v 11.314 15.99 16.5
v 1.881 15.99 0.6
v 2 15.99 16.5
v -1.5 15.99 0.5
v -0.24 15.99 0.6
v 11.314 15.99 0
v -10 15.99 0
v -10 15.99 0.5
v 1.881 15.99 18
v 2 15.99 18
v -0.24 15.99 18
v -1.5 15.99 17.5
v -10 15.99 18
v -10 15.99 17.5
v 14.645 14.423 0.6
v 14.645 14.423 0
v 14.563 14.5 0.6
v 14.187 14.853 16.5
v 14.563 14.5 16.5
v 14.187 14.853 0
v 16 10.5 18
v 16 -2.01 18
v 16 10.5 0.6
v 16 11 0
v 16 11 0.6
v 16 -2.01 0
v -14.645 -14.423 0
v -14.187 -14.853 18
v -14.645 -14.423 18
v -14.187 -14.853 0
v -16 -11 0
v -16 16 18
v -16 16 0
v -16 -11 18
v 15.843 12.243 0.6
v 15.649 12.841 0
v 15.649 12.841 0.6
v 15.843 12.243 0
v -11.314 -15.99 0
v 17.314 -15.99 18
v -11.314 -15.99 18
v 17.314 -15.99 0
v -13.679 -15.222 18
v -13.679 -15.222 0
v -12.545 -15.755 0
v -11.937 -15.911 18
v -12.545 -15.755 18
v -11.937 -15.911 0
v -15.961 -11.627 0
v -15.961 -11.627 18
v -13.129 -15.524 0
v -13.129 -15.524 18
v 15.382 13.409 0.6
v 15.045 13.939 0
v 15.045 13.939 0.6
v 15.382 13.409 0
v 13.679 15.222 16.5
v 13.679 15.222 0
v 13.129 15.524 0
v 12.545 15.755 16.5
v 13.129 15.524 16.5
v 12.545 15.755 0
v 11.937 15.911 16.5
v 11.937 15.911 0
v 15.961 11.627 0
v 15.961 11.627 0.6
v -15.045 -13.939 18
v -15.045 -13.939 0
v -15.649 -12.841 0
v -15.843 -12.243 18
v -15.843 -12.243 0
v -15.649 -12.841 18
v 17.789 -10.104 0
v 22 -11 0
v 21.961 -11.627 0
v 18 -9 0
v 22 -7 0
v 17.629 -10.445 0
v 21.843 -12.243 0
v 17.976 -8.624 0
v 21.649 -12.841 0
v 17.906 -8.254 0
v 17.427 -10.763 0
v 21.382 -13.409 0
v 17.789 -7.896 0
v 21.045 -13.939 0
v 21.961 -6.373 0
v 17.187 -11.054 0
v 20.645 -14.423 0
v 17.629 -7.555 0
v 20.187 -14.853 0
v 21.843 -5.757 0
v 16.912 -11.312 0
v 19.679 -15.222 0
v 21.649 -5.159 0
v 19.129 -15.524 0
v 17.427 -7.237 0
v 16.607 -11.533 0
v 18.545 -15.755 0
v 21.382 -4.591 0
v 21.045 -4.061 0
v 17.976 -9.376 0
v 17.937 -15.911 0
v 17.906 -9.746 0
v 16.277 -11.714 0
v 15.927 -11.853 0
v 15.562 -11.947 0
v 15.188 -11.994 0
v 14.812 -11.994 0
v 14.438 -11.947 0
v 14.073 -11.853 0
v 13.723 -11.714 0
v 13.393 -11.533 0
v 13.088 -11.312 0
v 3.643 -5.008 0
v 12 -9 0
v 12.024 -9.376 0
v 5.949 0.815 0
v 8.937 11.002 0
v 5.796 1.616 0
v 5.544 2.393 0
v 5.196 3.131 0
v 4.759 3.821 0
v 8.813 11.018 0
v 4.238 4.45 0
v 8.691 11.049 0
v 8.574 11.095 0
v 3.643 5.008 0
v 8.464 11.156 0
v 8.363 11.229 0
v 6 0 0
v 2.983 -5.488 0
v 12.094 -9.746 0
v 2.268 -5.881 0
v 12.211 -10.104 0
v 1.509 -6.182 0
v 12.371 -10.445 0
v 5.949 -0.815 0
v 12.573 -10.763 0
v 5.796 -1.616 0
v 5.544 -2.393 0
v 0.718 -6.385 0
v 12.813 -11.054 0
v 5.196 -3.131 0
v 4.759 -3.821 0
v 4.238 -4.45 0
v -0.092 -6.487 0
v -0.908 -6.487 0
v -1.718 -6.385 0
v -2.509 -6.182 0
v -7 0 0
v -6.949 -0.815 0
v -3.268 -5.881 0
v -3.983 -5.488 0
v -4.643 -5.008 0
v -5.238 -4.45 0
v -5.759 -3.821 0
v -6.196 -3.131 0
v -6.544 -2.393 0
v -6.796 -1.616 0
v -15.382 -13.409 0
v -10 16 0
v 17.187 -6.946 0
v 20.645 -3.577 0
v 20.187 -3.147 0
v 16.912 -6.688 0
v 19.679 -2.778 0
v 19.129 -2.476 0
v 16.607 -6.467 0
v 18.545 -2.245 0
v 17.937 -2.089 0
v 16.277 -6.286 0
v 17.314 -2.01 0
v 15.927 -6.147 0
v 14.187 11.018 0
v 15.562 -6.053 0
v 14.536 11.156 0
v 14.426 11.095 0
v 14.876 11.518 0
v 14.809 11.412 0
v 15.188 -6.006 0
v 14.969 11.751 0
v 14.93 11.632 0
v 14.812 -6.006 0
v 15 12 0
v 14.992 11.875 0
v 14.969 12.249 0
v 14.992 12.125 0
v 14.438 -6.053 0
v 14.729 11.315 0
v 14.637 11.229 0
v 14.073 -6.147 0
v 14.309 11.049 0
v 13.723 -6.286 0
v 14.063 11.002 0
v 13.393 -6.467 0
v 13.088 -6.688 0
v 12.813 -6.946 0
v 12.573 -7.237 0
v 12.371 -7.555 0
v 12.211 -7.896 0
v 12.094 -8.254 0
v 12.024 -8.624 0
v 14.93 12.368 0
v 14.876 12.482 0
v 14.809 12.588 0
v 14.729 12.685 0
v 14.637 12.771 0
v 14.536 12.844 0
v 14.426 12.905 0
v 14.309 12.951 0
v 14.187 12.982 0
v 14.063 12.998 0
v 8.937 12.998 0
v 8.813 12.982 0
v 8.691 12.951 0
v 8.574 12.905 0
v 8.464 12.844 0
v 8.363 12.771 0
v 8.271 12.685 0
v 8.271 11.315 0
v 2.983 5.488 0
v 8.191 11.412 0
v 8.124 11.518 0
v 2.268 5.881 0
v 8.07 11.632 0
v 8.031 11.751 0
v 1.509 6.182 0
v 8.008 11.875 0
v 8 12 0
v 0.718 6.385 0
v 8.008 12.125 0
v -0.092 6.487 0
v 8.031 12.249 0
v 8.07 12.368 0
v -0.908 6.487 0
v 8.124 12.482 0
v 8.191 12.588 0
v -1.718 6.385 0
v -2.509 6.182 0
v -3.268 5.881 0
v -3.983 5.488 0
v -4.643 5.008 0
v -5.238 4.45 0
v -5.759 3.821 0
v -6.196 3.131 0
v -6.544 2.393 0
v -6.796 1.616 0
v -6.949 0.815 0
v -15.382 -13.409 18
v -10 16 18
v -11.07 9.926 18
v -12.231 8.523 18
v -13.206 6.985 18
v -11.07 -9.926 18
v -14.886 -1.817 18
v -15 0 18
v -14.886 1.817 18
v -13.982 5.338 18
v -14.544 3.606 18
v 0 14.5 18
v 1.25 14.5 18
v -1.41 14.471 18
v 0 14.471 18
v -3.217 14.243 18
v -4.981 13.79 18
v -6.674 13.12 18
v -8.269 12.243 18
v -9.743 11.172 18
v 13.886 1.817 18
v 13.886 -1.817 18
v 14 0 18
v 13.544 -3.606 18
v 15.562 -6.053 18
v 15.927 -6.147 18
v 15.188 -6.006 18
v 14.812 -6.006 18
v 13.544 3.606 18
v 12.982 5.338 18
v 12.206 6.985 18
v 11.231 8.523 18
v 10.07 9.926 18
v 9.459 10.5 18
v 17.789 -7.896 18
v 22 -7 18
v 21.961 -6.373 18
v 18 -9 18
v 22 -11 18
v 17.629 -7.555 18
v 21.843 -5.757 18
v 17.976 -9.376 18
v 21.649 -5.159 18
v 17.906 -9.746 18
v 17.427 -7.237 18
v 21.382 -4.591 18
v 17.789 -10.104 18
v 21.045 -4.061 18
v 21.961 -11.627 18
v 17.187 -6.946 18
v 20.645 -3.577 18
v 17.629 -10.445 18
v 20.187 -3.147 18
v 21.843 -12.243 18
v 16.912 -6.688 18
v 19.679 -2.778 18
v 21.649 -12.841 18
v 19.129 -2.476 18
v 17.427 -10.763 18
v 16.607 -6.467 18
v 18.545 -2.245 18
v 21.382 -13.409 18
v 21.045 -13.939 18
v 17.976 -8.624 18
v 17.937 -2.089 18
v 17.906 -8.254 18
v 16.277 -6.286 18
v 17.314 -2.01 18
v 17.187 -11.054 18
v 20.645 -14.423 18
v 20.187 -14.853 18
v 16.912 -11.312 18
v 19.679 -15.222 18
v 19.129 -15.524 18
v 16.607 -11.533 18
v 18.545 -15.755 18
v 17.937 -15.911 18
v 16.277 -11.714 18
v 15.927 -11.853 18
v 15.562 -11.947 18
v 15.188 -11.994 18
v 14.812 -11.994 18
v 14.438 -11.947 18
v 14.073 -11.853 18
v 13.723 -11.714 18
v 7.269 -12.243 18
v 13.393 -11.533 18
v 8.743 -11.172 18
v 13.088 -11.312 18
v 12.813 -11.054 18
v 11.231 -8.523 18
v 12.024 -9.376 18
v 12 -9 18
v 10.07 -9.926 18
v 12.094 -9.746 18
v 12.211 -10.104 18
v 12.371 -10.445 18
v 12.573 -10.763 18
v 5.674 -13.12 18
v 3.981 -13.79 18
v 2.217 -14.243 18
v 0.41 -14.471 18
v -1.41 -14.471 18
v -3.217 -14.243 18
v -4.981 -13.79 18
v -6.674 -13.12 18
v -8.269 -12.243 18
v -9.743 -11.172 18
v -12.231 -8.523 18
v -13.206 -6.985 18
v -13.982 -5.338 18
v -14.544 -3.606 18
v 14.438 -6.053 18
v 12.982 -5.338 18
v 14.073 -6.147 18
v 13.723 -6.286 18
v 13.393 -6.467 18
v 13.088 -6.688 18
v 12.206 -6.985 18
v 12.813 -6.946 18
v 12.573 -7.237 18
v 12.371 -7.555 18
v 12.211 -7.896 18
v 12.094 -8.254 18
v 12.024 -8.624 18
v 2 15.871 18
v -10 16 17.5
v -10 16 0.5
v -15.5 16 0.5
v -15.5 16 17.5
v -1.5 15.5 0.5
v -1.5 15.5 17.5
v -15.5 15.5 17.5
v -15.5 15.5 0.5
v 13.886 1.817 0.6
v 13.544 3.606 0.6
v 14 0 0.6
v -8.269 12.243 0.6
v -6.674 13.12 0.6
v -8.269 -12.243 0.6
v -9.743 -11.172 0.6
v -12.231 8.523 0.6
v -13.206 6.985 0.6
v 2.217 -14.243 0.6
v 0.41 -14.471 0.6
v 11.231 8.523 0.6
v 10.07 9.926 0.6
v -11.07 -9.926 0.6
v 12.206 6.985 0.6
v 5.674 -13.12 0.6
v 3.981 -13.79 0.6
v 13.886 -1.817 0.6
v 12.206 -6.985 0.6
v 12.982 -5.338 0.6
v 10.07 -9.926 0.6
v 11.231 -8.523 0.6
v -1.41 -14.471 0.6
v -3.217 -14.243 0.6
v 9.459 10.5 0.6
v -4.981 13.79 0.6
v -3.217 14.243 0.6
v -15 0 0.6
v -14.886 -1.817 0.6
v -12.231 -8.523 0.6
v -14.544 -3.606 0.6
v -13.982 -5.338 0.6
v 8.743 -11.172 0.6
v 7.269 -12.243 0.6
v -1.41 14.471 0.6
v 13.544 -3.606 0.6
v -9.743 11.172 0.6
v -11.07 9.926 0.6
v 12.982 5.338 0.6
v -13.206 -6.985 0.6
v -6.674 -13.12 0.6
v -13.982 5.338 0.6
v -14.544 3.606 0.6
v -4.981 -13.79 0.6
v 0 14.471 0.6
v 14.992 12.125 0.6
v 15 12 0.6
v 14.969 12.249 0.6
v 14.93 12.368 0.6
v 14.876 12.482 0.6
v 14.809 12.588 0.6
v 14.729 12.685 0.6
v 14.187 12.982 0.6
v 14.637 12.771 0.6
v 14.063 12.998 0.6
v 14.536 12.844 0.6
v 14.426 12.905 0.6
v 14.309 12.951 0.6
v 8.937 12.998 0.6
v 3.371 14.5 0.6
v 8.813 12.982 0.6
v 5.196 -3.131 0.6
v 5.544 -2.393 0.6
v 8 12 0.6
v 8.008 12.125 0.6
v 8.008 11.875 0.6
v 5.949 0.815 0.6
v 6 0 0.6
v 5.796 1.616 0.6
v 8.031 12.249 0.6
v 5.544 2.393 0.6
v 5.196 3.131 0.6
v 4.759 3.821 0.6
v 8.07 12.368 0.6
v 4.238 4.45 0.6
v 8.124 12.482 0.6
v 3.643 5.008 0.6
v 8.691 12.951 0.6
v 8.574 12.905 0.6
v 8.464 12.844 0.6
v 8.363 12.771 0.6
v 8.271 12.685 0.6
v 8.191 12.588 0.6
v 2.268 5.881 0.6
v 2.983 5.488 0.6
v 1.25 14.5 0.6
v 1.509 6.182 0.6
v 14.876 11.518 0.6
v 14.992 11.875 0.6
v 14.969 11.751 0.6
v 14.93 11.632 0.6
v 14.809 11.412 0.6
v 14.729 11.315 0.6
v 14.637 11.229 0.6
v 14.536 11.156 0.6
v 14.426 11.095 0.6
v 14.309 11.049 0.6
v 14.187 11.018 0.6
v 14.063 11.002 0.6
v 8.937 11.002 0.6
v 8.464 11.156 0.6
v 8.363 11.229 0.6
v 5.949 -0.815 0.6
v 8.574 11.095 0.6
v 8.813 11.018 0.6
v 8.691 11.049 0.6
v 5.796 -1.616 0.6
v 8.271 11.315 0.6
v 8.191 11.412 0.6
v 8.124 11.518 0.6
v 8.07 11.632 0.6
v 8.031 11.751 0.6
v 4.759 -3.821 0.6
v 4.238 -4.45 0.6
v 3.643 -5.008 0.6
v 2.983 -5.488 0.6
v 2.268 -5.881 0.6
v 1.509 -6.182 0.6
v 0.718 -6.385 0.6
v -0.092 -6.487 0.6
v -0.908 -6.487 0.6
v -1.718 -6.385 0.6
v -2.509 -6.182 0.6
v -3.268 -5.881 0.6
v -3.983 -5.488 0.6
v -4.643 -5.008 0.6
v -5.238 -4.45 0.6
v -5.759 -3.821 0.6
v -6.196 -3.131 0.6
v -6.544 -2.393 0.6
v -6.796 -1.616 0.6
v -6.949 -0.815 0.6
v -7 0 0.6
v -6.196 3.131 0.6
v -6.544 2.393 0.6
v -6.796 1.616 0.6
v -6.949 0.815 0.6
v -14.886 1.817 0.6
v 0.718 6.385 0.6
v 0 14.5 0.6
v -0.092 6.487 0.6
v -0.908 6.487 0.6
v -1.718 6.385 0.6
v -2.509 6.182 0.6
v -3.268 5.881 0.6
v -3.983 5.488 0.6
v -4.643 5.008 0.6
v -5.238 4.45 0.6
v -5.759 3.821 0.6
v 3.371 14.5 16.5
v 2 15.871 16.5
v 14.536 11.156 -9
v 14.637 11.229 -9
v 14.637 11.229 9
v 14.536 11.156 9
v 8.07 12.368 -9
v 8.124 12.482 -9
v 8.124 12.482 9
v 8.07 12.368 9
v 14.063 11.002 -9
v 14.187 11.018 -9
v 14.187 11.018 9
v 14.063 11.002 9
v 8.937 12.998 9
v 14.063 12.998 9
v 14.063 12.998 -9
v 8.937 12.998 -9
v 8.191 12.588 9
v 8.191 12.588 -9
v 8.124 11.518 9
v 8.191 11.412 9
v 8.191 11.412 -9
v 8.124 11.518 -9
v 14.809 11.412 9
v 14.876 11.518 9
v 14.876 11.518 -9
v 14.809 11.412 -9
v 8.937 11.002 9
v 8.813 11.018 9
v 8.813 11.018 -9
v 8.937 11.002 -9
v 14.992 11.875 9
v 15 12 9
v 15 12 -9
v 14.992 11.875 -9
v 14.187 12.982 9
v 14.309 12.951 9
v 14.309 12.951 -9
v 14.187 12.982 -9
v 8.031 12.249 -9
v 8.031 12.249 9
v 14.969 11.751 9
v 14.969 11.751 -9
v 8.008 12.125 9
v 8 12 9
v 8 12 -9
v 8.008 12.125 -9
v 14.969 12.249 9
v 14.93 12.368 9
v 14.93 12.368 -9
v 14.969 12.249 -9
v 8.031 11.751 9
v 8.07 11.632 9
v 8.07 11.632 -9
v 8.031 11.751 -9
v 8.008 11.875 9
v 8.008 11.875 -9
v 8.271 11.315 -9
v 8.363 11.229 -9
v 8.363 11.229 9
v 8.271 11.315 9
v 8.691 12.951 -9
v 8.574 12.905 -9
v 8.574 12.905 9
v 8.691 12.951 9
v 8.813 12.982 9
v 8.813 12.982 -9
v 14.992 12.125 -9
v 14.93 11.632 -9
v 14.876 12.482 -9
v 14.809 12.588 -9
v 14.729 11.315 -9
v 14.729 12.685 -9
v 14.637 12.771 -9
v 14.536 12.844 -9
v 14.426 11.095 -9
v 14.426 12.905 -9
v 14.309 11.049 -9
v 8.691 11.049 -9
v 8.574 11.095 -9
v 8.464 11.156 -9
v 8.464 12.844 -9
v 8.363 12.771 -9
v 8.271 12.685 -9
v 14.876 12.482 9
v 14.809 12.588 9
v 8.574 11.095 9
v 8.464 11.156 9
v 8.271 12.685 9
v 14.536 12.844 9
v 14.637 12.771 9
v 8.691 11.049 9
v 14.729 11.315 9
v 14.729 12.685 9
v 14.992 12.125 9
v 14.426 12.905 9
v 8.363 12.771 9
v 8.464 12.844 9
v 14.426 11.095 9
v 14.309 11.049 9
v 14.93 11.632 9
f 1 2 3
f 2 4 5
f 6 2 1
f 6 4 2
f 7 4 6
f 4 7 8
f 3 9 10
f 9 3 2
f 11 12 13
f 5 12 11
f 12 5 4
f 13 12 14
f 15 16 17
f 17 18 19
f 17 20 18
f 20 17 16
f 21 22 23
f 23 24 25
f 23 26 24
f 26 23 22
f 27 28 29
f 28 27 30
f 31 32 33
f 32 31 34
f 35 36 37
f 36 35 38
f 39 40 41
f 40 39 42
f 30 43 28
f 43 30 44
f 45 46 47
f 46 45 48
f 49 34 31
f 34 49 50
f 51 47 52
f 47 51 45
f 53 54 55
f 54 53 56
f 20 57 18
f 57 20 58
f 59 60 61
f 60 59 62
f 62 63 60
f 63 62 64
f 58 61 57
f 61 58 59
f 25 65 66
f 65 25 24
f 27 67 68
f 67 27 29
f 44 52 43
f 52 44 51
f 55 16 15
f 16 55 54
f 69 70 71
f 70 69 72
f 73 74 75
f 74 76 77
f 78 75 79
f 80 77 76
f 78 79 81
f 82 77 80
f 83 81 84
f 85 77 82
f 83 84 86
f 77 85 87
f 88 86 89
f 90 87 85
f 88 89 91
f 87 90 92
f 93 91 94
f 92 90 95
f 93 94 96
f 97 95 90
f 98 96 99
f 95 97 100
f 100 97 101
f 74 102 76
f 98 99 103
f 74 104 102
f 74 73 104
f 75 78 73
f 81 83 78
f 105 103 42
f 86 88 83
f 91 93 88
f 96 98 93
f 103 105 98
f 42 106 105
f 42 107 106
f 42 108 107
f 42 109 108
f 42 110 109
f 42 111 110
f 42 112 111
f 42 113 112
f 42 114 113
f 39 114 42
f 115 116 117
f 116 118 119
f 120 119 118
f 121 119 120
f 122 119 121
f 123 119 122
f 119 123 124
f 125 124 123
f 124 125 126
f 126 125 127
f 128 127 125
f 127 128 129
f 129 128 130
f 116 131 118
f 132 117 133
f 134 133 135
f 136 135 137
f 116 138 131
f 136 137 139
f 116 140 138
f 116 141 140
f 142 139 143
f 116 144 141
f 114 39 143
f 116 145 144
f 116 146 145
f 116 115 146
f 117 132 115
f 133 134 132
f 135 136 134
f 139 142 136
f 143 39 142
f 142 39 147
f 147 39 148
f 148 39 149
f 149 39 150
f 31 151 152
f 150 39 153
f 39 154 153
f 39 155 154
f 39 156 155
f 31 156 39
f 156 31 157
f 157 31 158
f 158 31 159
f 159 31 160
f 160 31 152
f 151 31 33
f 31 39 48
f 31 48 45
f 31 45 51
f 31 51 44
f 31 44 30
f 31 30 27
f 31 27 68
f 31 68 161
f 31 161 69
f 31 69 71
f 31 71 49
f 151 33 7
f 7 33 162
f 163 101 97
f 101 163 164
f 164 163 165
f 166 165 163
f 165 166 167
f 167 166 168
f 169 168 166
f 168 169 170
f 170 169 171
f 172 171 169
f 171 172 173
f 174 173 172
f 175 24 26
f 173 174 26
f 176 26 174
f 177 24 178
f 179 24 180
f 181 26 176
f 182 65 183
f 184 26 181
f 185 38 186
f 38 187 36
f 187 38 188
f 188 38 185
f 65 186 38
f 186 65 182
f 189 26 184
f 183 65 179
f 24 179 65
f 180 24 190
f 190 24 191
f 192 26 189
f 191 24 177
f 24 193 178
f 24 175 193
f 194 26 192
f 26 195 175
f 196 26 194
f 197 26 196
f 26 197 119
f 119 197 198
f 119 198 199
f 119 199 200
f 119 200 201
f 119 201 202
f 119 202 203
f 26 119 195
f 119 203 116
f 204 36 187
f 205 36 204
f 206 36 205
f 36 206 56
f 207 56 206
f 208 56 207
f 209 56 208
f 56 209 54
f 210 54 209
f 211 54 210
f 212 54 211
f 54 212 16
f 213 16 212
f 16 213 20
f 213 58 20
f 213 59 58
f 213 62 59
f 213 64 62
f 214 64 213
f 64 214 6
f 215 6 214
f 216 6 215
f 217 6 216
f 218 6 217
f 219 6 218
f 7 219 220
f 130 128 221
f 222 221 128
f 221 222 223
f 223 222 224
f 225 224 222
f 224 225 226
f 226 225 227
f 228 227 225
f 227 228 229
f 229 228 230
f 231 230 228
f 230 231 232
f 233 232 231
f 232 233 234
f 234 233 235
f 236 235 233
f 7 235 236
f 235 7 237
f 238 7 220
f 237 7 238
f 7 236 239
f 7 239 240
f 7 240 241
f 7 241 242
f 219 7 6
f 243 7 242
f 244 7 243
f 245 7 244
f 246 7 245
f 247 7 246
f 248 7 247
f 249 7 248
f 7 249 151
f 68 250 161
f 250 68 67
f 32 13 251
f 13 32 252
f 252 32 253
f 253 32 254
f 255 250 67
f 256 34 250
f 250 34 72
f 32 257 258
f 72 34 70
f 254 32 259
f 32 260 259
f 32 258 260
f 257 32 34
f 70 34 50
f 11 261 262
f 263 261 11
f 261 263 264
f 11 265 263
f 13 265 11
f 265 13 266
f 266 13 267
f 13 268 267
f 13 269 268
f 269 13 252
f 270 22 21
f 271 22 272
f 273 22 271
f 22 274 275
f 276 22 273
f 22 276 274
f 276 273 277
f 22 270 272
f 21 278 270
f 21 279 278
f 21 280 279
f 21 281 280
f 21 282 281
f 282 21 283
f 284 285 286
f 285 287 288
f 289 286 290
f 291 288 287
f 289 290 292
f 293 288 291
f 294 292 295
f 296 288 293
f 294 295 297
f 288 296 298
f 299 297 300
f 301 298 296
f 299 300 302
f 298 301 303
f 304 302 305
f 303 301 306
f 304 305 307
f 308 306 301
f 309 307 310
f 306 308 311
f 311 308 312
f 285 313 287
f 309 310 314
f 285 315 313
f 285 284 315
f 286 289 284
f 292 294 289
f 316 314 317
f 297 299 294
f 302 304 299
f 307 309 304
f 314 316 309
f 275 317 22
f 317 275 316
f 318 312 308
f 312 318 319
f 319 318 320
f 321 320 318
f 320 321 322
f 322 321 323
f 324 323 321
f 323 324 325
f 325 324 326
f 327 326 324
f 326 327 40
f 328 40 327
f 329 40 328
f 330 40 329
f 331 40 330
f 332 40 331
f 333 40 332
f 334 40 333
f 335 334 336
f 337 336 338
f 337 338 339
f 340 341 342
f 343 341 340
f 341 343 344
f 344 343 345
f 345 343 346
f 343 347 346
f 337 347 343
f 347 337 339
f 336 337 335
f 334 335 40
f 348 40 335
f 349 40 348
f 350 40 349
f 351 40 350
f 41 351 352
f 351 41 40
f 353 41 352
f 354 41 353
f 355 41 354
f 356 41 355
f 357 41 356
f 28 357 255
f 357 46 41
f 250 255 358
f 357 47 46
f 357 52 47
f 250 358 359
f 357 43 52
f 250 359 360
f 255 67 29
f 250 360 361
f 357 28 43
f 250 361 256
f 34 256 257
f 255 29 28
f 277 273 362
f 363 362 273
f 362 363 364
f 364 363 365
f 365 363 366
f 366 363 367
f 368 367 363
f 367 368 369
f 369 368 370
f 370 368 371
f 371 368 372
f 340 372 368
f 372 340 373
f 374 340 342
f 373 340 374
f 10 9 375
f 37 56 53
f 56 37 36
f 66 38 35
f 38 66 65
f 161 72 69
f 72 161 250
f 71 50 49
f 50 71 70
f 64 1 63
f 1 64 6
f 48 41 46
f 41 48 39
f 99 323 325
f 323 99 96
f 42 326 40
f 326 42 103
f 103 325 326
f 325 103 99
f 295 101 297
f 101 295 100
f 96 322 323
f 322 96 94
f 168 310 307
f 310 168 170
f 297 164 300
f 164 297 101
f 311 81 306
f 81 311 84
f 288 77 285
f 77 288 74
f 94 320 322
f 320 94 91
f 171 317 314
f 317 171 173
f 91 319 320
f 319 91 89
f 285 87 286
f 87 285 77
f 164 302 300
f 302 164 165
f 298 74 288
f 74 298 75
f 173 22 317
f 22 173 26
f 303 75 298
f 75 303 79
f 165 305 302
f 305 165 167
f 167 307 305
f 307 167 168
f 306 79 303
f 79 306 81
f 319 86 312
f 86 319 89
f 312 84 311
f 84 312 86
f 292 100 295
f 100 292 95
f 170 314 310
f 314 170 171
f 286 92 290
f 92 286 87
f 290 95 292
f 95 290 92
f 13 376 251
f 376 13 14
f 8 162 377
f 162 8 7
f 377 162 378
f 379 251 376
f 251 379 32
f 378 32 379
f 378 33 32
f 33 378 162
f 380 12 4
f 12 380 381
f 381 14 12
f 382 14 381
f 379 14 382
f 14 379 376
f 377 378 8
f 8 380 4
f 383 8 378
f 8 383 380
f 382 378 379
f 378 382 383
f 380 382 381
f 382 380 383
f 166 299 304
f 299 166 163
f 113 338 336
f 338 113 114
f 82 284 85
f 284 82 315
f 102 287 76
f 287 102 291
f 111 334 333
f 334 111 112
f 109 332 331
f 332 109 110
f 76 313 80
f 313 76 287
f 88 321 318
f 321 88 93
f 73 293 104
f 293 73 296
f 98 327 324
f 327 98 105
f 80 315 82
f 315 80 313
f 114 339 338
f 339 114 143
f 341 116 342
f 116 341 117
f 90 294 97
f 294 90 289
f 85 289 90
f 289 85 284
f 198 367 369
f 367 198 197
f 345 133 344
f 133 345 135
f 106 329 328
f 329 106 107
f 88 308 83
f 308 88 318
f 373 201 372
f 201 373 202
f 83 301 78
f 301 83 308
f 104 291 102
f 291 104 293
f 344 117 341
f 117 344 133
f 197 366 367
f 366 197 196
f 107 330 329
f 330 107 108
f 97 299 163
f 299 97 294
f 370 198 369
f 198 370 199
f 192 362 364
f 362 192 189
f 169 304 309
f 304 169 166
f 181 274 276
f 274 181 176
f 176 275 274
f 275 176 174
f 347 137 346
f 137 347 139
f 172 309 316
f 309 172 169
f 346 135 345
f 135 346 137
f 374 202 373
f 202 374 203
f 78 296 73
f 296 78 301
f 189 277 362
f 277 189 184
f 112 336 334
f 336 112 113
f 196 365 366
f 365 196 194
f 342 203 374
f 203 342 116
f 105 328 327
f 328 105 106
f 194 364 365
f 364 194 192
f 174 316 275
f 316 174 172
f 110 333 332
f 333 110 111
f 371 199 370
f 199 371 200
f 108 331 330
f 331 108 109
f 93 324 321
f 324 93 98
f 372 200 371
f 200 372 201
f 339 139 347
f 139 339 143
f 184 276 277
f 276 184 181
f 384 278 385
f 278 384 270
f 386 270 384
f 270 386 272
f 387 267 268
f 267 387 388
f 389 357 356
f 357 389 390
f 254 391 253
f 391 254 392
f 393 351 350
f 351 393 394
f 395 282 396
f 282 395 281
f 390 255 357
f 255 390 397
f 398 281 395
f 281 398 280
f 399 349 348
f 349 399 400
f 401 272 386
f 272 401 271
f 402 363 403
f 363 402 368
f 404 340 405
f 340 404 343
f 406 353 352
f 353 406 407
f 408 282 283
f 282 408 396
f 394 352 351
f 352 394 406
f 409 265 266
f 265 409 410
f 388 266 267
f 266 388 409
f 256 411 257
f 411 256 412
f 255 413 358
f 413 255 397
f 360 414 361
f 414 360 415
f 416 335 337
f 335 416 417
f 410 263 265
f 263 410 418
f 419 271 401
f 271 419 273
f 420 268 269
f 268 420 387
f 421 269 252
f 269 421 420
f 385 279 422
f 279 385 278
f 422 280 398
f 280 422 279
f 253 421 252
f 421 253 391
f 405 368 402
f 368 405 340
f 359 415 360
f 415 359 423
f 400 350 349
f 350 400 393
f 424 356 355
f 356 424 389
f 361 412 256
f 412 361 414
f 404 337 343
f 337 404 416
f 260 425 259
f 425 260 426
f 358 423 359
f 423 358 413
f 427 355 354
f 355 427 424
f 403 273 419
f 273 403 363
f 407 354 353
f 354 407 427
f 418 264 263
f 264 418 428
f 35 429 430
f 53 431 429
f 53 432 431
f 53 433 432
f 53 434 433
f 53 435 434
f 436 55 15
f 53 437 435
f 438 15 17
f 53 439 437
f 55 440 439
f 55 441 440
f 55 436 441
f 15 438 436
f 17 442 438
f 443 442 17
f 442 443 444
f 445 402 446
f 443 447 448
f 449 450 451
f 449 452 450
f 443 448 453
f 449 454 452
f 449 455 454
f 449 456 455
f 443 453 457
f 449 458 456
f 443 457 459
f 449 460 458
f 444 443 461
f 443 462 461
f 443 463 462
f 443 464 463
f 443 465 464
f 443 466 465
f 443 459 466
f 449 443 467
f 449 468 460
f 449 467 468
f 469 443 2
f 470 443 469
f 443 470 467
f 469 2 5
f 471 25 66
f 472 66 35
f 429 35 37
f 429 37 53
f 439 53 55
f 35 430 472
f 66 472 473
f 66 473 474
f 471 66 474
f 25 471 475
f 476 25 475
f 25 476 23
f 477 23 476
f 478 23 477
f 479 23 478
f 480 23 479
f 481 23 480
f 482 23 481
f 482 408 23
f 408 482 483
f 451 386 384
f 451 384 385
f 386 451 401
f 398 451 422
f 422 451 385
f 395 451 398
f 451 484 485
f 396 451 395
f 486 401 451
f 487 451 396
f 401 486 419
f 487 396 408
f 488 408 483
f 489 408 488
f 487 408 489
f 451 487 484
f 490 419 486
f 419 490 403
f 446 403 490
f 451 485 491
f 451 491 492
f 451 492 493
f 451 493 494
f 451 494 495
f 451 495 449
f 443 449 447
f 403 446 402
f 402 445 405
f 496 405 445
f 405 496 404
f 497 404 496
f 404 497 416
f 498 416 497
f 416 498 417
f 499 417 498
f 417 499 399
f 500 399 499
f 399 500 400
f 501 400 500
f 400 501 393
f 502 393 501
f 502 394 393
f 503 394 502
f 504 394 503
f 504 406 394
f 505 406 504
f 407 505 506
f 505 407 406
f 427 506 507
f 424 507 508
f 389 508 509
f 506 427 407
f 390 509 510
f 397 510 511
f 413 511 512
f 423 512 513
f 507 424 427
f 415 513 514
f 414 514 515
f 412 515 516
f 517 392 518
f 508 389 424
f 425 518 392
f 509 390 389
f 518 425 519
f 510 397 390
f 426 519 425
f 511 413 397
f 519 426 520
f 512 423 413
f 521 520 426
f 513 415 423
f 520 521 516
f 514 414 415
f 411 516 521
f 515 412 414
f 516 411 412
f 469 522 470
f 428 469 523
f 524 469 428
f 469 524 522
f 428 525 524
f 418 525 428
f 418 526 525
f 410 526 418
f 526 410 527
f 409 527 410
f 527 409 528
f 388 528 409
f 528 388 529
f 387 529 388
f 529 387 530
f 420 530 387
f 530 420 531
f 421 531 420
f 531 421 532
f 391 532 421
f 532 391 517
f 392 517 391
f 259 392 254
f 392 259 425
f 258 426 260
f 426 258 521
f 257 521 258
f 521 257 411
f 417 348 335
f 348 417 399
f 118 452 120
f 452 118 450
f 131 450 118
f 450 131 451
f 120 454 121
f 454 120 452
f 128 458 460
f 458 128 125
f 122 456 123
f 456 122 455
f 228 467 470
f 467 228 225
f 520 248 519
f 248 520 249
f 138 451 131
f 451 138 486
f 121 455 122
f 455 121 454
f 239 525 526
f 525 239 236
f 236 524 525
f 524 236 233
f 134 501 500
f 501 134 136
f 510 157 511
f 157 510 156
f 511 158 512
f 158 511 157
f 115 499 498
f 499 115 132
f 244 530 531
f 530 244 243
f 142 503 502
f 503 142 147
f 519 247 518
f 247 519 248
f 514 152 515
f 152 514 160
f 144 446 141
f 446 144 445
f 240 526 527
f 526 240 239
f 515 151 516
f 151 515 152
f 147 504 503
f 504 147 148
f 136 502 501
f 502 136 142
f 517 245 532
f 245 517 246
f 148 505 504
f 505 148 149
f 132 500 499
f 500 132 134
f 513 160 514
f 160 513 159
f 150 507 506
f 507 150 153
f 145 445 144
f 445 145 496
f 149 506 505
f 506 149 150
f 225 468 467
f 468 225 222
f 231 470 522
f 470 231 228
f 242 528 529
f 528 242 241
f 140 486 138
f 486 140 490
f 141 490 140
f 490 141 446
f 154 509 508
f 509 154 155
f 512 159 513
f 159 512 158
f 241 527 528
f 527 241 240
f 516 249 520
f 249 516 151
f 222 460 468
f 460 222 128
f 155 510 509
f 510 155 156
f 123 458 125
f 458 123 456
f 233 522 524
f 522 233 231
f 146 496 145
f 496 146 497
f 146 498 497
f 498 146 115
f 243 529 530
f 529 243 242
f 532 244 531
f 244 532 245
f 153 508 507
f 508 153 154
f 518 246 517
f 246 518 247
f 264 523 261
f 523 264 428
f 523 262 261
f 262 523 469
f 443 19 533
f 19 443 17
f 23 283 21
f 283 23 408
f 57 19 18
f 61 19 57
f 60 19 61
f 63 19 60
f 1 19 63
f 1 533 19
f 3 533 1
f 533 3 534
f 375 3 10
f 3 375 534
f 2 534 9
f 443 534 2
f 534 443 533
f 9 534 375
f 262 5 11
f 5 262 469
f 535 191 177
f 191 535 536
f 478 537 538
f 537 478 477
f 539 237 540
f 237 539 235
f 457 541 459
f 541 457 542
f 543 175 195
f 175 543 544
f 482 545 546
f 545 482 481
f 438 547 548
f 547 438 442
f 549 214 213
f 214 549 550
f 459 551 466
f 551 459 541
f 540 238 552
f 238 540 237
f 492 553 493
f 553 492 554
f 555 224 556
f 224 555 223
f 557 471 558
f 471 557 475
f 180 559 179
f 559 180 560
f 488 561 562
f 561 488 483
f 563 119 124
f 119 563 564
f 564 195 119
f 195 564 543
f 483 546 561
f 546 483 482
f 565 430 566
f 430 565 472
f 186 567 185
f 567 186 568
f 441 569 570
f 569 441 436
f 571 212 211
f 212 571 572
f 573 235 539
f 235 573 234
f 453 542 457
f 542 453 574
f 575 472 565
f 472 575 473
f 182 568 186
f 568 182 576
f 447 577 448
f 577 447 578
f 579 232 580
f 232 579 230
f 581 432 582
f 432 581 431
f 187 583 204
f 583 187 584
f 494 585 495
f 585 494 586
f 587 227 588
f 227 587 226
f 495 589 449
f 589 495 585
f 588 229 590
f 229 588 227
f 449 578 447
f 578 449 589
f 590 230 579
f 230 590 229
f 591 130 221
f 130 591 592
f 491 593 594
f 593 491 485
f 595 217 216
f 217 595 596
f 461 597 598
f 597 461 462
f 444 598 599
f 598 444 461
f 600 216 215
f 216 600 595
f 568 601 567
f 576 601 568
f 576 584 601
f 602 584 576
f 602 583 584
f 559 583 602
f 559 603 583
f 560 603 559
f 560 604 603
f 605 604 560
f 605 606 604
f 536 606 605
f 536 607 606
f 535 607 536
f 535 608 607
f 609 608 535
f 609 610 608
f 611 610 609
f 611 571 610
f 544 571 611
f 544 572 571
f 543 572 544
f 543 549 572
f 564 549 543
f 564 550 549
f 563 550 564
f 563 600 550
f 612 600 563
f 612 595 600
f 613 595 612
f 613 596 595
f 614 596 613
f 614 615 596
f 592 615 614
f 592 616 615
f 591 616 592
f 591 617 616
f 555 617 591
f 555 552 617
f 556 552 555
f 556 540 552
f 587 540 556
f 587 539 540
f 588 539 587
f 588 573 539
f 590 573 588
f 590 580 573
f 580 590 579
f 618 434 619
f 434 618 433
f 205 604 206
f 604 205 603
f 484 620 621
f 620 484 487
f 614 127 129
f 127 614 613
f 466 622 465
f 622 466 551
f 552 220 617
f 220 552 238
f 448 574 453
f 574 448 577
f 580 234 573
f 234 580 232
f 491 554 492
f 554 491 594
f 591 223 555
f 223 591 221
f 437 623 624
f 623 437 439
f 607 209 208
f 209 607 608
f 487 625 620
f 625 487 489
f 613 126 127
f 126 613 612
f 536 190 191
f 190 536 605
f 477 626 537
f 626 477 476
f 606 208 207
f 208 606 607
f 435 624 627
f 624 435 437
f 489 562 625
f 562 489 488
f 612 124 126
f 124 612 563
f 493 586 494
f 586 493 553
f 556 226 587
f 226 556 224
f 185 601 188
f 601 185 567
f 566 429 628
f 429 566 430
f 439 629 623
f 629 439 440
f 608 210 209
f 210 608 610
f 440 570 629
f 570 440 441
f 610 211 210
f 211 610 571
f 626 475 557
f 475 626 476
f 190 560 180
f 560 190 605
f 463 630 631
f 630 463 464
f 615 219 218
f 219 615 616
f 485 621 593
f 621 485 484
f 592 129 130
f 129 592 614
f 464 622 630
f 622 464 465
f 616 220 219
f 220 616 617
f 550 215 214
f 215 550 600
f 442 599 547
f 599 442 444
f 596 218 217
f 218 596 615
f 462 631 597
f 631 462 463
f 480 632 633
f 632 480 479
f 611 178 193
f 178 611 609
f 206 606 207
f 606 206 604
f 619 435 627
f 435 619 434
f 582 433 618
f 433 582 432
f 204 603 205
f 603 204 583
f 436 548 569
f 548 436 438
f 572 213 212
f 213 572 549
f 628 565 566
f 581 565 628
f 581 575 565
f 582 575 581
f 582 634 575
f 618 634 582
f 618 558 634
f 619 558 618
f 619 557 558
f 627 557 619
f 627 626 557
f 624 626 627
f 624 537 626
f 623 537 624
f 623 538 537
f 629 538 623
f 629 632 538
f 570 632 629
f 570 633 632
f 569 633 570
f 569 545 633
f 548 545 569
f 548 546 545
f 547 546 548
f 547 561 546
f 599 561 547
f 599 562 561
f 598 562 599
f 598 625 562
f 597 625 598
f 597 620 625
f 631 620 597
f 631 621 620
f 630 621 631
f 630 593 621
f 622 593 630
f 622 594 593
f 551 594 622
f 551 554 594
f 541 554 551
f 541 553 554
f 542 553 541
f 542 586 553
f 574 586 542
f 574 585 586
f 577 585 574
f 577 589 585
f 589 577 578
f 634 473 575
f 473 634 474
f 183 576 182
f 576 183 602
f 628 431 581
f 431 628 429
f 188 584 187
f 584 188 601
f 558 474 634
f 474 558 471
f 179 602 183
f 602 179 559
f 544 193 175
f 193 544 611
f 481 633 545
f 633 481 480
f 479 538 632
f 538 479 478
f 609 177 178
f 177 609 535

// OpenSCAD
$fn = 50;


union() {
	difference() {
		union() {
			hull() {
				translate(v = [-11.0000000000, 11.0000000000, 0]) {
					cylinder(h = 18, r = 5);
				}
				translate(v = [11.0000000000, 11.0000000000, 0]) {
					cylinder(h = 18, r = 5);
				}
				translate(v = [-11.0000000000, -11.0000000000, 0]) {
					cylinder(h = 18, r = 5);
				}
				translate(v = [11.0000000000, -11.0000000000, 0]) {
					cylinder(h = 18, r = 5);
				}
			}
			translate(v = [7.5000000000, -9.0000000000, 0]) {
				hull() {
					translate(v = [-9.5000000000, 2.0000000000, 0]) {
						cylinder(h = 18, r = 5);
					}
					translate(v = [9.5000000000, 2.0000000000, 0]) {
						cylinder(h = 18, r = 5);
					}
					translate(v = [-9.5000000000, -2.0000000000, 0]) {
						cylinder(h = 18, r = 5);
					}
					translate(v = [9.5000000000, -2.0000000000, 0]) {
						cylinder(h = 18, r = 5);
					}
				}
			}
			translate(v = [-16.0000000000, 10.0000000000, 0]) {
				cube(size = [6, 6, 18]);
			}
		}
		union() {
			translate(v = [-15.5000000000, 15.5000000000, 0.5000000000]) {
				cube(size = [14, 0.5000000000, 17.0000000000]);
			}
			translate(v = [15.0000000000, -9.0000000000, -100.0000000000]) {
				cylinder(h = 200, r = 3.0000000000);
			}
			translate(v = [-0.5000000000, 0.0000000000, 0.6000000000]) {
				cylinder(h = 20.4000000000, r = 14.5000000000);
			}
			translate(v = [-0.5000000000, 0.0000000000, -9.0000000000]) {
				cylinder(h = 18, r = 6.5000000000);
			}
			translate(v = [0.0000000000, 10.5000000000, 0.6000000000]) {
				cube(size = [16.0000000000, 4, 20.4000000000]);
			}
			translate(v = [2.0000000000, 10.5000000000, 16.5000000000]) {
				cube(size = [14.0000000000, 7, 1.5000000000]);
			}
			translate(v = [-3.0000000000, 18.7500000000, 0.6000000000]) {
				rotate(a = [0, 0, -45]) {
					cube(size = [10, 1.5000000000, 20.4000000000]);
				}
			}
			translate(v = [2.2500000000, 11.0000000000, 0.6000000000]) {
				cube(size = [7.5000000000, 2, 17.4000000000]);
			}
		}
	}
	union() {
		translate(v = [11.5000000000, 12, -9.0000000000]) {
			rotate(a = [0, 0, 0]) {
				difference() {
					union() {
						hull() {
							translate(v = [2.5000000000, 0, 0]) {
								cylinder(h = 18, r = 1.0000000000, r1 = 1.0000000000, r2 = 1.0000000000);
							}
							translate(v = [-2.5000000000, 0, 0]) {
								cylinder(h = 18, r = 1.0000000000, r1 = 1.0000000000, r2 = 1.0000000000);
							}
						}
					}
					union();
				}
			}
		}
	}
}
